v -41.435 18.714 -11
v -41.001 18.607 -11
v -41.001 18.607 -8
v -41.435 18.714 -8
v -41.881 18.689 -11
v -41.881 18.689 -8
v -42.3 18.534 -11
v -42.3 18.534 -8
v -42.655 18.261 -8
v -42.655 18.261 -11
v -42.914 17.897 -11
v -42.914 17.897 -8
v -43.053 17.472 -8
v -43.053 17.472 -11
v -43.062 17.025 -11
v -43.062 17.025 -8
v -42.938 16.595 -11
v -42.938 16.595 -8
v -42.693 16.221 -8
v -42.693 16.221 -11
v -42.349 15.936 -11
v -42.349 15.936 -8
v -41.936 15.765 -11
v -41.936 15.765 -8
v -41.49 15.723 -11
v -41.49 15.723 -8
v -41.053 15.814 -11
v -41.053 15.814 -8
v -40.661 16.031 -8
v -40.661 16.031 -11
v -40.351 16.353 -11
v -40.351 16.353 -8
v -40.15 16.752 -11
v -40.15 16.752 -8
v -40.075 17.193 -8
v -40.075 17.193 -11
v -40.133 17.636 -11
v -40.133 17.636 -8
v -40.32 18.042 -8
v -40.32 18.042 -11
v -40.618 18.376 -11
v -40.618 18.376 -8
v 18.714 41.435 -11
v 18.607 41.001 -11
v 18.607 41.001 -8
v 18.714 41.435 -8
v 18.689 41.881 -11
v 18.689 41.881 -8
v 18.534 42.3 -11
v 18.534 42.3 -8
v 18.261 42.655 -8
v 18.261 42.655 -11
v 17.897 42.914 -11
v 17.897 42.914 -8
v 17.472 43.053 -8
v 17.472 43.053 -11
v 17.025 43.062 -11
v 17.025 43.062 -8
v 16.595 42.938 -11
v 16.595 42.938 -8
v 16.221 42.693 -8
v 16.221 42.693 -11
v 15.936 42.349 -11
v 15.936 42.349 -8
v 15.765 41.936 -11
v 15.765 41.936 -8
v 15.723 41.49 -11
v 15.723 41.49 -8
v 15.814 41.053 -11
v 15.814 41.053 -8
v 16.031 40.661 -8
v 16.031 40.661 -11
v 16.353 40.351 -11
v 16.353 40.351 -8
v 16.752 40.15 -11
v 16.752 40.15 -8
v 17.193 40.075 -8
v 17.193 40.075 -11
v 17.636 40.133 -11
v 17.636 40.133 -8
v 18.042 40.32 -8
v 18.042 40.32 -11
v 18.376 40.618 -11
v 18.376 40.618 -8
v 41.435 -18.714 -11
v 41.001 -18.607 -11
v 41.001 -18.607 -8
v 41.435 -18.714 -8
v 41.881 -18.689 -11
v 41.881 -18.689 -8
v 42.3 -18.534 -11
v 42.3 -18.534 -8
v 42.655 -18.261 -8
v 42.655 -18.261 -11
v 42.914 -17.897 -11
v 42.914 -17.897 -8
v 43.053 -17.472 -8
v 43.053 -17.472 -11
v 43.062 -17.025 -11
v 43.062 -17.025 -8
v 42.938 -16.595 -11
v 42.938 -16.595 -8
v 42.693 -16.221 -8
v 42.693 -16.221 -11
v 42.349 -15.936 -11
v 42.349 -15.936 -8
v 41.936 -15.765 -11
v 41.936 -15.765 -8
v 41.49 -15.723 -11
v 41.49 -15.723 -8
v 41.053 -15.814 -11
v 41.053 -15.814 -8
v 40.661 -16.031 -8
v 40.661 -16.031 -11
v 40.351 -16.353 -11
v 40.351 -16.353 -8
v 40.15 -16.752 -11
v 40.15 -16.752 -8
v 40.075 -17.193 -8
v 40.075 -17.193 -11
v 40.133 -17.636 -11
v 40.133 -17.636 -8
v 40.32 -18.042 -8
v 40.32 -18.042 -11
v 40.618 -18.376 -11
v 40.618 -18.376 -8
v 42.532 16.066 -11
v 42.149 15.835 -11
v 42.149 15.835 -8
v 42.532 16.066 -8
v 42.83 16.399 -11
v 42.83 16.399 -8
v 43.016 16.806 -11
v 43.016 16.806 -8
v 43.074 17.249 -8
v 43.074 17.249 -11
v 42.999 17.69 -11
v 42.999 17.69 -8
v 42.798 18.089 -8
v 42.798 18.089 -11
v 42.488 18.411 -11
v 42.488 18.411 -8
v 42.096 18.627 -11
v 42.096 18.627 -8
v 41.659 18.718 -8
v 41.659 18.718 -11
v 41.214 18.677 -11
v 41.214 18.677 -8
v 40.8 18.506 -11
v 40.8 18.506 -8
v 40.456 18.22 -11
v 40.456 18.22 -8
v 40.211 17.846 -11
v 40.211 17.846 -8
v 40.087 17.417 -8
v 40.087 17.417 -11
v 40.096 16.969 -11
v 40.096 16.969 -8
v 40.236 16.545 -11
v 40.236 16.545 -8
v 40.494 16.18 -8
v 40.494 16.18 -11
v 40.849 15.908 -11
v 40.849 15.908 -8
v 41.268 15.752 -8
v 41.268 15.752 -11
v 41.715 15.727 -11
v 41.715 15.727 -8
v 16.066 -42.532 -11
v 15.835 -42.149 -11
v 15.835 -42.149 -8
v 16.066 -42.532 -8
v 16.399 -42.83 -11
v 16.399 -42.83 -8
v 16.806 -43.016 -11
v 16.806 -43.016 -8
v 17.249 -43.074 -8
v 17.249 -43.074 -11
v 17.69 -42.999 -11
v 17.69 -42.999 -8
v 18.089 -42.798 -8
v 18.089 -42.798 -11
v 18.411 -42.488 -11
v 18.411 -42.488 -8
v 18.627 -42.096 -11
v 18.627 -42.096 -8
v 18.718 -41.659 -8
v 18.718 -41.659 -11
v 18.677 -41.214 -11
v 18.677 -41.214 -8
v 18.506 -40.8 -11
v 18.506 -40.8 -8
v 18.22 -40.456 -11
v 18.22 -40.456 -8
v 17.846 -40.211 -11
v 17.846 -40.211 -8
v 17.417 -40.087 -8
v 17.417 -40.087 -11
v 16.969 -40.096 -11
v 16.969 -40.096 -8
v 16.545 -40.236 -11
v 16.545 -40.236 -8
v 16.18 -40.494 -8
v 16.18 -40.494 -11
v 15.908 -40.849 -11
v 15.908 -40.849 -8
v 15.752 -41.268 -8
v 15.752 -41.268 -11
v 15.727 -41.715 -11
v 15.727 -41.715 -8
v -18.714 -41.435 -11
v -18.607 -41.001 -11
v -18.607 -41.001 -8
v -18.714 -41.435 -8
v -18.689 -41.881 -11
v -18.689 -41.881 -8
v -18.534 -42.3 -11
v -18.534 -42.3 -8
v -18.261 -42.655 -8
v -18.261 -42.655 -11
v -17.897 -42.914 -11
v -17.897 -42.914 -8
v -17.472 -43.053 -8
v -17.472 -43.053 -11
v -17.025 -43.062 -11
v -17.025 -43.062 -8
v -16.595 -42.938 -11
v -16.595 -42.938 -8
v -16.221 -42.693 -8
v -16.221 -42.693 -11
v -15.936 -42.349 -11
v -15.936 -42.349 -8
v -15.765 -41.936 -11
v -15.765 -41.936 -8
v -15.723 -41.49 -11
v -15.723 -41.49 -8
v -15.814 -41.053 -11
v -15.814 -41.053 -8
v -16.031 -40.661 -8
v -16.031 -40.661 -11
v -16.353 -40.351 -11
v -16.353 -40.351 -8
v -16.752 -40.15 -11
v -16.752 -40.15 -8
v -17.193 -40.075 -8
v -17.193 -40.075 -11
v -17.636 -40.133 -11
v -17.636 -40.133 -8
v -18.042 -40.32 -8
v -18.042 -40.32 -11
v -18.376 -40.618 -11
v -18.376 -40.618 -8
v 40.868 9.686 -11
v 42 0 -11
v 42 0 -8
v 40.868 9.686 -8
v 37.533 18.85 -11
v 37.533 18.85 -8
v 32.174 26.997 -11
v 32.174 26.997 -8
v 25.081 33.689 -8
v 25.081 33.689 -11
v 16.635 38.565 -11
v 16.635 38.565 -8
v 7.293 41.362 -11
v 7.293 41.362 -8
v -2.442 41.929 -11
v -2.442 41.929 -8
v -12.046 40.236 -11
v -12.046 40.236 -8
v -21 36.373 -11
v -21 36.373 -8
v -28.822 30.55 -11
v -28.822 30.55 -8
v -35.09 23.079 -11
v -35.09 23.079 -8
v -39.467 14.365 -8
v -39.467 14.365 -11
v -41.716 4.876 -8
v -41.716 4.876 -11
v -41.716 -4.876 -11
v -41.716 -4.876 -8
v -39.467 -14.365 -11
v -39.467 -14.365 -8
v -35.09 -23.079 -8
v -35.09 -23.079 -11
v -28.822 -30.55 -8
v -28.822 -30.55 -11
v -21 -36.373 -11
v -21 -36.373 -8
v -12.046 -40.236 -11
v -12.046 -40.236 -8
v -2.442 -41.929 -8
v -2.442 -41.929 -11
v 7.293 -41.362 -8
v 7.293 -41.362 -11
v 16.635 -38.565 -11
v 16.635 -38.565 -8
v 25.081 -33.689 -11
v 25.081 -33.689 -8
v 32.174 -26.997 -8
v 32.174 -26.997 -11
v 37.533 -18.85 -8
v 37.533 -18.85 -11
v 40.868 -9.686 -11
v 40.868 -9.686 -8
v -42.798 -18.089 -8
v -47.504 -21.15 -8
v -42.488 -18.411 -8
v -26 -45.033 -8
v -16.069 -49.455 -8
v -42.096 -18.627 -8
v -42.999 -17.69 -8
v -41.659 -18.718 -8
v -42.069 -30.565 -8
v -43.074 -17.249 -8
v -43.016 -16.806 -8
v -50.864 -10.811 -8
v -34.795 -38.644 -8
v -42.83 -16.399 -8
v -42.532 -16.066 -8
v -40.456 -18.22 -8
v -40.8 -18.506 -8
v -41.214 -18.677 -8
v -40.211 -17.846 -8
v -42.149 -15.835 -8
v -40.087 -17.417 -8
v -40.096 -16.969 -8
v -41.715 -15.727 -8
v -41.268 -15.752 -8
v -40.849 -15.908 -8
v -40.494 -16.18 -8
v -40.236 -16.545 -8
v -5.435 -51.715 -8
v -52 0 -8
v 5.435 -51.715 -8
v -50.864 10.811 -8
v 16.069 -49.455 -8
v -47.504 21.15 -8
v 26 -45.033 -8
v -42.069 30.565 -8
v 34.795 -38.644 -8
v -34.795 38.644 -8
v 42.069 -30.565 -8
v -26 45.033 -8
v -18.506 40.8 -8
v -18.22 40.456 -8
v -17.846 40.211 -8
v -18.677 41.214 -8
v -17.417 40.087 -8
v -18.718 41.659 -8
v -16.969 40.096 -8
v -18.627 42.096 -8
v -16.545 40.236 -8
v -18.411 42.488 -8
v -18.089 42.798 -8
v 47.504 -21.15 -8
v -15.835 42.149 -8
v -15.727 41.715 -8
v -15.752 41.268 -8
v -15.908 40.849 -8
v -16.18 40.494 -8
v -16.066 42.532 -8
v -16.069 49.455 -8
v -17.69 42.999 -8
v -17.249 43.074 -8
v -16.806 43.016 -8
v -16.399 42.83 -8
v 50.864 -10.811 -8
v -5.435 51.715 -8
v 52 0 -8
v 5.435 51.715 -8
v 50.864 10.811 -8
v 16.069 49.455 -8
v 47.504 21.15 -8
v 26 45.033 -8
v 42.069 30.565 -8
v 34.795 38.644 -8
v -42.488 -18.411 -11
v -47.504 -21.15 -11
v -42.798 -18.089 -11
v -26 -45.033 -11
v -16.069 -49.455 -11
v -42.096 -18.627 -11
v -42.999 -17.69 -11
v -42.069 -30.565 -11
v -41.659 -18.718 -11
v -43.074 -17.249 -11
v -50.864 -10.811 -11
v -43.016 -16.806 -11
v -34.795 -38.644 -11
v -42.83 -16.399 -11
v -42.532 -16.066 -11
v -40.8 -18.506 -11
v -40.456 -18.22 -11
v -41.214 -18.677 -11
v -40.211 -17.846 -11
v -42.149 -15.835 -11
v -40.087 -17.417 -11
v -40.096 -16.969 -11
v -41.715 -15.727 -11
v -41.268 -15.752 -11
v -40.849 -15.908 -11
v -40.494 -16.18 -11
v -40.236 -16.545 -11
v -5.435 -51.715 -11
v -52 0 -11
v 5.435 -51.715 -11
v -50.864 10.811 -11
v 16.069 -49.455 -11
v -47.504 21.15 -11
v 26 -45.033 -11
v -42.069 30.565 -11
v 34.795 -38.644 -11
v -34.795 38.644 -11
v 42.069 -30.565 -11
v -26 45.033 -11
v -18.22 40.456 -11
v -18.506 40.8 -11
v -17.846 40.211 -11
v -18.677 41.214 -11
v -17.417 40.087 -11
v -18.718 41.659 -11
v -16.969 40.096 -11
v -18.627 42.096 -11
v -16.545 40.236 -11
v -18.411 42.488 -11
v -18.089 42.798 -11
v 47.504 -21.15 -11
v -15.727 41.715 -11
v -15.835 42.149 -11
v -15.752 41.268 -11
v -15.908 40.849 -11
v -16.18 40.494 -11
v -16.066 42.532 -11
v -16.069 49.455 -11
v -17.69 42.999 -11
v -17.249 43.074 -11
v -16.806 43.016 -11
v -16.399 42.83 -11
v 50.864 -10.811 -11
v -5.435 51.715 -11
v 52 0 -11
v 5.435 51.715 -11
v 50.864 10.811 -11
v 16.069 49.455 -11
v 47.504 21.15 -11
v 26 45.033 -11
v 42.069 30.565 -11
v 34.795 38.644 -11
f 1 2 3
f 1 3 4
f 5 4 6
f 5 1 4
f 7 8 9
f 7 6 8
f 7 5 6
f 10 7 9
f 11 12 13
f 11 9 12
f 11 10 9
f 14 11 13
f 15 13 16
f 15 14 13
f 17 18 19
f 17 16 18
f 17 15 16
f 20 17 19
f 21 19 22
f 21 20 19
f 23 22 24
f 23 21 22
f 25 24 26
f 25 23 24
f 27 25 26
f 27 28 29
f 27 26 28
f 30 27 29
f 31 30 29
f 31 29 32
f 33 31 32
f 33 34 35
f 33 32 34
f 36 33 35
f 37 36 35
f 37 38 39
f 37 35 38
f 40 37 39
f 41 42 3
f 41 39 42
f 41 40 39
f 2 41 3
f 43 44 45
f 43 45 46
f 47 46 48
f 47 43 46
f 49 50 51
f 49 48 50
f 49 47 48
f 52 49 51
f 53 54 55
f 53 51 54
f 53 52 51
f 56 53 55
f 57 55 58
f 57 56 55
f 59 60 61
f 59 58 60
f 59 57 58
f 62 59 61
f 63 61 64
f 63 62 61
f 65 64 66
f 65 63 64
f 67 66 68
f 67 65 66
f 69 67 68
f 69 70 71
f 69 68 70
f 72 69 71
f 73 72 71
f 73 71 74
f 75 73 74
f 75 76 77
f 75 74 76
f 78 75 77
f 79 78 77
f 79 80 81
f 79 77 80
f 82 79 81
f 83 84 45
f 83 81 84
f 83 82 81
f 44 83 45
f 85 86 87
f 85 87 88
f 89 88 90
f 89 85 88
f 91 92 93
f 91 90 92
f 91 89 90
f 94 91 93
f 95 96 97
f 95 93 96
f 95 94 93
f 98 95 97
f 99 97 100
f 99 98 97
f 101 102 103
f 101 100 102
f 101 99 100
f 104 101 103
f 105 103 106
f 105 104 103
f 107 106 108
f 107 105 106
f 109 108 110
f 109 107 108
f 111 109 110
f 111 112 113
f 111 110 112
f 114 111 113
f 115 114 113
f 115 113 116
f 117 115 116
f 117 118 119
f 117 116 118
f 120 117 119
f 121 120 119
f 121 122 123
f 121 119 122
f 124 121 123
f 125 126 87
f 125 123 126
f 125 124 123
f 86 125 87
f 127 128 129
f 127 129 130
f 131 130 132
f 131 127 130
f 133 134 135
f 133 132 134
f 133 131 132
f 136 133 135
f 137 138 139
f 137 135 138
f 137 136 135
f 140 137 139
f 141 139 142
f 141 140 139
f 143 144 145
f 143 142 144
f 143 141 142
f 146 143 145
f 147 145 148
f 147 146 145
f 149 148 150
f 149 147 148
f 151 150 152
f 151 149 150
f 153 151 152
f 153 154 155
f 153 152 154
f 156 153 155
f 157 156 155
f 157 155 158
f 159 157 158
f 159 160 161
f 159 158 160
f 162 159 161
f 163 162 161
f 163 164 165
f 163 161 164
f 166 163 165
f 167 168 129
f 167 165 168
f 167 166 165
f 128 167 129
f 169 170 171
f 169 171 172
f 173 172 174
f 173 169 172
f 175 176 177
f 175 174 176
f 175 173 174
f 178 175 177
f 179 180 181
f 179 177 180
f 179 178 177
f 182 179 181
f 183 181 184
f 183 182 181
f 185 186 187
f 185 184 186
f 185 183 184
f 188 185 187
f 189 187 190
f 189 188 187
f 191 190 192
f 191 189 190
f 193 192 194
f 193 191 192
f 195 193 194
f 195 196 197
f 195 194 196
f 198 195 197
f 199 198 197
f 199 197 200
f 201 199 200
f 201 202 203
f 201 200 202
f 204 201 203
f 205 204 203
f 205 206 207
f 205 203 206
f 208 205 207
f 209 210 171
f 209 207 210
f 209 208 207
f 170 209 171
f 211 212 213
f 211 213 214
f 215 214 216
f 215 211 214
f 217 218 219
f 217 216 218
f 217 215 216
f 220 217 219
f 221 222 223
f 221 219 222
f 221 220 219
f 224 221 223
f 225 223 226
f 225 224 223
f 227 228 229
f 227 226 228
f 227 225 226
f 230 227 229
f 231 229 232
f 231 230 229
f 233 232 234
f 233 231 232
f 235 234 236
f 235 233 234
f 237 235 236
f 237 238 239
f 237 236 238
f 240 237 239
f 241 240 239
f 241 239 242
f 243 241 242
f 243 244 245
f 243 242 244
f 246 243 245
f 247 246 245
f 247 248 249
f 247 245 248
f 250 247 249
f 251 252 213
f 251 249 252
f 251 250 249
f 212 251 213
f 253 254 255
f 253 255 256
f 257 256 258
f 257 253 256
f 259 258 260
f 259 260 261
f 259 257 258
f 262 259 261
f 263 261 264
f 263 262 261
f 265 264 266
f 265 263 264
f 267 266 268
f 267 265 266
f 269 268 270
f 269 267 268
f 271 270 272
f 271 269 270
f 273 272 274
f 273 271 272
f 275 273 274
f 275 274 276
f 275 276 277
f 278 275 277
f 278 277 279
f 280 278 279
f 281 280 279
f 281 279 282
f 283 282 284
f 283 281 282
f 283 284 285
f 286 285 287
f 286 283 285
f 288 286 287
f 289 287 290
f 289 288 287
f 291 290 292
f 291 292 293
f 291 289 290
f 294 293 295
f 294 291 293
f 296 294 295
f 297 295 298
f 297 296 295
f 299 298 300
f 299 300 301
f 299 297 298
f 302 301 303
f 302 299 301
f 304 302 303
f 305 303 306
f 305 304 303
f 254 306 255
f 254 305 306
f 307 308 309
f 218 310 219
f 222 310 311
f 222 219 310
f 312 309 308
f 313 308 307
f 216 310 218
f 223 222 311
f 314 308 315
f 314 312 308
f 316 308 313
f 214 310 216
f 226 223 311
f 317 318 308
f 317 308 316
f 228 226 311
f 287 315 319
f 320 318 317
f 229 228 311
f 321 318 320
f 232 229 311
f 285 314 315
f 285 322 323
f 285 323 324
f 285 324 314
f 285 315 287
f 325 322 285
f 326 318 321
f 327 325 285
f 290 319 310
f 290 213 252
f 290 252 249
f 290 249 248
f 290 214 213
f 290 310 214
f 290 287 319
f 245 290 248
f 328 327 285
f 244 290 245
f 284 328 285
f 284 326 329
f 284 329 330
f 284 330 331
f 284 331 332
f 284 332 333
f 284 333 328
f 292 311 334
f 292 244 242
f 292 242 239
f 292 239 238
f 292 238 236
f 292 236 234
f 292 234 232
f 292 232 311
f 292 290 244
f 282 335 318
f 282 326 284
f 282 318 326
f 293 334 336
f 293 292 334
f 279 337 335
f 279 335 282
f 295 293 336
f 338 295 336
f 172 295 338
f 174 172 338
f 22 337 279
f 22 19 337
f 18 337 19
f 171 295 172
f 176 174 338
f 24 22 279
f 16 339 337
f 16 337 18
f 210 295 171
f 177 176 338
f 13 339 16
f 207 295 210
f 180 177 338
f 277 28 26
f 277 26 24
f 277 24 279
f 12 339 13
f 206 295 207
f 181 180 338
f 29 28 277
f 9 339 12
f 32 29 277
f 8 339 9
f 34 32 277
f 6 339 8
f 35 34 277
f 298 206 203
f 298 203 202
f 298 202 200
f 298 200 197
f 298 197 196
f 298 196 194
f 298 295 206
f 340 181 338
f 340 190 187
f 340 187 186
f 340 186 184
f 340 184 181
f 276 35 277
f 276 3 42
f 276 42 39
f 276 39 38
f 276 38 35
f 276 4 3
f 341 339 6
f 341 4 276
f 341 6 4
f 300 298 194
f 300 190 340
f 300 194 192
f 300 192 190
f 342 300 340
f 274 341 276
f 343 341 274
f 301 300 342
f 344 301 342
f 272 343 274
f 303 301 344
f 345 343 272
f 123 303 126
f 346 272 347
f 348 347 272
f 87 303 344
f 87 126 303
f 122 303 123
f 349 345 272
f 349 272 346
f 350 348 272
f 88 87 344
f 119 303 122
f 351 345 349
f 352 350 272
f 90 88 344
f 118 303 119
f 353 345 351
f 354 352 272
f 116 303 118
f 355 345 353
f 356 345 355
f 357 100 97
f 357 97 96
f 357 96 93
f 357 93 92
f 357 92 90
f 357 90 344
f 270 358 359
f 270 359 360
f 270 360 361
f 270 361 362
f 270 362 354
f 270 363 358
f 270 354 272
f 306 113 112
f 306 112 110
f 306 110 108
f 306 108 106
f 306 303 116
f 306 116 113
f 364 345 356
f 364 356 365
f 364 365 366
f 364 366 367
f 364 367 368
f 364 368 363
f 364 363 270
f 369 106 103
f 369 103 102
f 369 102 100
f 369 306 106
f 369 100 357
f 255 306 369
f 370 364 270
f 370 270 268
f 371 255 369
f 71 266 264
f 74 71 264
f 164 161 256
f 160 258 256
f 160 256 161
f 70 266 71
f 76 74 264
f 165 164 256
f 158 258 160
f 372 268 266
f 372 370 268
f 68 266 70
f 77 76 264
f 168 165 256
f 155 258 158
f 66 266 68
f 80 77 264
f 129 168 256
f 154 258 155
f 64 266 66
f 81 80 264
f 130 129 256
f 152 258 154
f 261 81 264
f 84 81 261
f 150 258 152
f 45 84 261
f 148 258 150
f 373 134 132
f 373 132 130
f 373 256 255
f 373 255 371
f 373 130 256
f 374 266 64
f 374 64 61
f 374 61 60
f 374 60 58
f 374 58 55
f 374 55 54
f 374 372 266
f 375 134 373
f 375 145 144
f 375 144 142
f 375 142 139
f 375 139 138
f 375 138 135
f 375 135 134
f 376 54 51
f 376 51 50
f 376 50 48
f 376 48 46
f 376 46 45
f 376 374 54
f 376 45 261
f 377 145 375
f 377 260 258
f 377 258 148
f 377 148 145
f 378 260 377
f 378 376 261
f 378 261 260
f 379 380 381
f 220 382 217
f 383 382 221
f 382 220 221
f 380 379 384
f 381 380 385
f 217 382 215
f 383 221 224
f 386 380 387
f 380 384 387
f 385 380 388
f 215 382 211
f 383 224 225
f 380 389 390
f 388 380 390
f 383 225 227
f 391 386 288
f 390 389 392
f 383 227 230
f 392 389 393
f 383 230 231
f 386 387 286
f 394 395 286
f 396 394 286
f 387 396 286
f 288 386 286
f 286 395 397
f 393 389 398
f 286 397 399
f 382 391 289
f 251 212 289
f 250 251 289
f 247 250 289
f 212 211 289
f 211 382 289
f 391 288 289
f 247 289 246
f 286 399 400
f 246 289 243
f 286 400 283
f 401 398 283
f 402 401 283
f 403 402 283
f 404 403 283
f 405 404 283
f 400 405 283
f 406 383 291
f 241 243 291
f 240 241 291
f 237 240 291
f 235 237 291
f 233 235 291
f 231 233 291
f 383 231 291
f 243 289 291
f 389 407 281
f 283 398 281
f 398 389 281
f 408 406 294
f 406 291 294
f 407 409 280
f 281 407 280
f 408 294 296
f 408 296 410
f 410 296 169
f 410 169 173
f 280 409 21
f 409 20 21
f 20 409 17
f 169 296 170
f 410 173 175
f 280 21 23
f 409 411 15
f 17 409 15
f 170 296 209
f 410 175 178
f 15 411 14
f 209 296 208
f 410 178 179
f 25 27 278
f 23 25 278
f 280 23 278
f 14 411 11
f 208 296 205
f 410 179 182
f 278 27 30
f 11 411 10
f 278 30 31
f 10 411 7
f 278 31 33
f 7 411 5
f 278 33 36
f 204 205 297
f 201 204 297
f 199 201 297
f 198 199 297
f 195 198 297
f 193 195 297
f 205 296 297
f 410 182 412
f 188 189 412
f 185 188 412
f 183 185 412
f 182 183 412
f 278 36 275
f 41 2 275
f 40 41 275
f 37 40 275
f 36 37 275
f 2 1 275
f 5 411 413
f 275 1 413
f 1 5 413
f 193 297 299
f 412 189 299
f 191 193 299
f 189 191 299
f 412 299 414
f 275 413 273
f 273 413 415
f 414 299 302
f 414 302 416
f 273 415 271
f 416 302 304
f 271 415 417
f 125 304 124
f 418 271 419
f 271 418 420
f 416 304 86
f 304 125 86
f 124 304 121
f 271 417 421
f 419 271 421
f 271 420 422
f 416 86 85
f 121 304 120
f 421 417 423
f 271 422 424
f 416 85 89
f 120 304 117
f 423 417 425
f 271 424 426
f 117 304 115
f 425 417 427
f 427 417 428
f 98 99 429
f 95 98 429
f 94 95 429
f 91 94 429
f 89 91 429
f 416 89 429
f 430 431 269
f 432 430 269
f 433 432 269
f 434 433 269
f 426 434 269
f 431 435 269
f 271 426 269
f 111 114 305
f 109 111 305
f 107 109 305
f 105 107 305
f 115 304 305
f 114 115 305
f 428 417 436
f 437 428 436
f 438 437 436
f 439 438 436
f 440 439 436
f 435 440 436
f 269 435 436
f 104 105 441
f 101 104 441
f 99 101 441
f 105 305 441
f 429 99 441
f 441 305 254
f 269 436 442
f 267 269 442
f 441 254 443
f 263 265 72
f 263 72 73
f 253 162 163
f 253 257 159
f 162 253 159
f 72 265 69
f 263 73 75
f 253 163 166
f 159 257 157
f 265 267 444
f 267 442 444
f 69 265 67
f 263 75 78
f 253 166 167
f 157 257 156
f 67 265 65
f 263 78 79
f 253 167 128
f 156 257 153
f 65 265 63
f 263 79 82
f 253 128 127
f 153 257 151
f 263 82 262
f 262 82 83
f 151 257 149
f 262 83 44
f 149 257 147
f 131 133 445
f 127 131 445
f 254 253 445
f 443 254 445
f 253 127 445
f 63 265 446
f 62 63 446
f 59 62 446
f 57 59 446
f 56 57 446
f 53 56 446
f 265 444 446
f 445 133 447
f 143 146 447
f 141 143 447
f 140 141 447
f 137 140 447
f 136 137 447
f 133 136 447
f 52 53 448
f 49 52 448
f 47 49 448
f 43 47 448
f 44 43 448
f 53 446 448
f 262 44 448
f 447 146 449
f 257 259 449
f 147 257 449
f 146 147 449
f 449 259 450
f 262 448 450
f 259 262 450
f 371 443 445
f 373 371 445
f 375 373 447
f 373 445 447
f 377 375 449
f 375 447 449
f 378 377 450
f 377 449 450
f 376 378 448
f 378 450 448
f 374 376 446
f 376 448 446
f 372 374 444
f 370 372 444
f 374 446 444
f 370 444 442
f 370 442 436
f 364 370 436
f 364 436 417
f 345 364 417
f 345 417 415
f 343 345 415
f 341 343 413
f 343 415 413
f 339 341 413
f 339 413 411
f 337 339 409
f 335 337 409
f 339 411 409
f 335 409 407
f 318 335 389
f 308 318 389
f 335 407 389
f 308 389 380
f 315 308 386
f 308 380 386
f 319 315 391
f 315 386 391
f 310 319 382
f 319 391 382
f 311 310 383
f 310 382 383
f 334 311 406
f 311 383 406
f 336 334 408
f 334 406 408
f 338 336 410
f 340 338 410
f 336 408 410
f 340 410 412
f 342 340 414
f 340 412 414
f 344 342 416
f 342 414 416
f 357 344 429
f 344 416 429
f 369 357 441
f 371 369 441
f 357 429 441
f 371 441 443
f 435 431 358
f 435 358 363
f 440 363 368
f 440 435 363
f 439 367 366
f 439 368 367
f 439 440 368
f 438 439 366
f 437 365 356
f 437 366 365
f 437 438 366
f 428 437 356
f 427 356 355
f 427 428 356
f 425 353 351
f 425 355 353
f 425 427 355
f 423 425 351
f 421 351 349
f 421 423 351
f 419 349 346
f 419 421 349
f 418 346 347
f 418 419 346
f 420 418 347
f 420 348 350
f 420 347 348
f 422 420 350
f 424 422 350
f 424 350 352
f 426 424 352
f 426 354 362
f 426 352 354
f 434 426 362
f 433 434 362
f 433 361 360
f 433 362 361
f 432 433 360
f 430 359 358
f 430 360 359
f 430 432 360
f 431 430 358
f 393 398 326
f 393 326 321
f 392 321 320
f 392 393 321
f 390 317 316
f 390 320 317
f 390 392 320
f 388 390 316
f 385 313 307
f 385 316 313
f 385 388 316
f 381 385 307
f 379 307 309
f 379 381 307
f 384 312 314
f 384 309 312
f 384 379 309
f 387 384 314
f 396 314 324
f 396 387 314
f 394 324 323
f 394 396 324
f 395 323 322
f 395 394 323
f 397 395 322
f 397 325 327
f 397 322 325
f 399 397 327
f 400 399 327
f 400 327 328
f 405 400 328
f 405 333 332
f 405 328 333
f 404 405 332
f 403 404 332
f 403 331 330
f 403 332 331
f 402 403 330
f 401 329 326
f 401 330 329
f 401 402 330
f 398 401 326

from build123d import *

# Parameters (mm, degrees)
CYLINDER250_R               = 1.5
CYLINDER250_DEPTH           = 20
CYLINDER250_PLACEMENT_ANGLE = 45
CYLINDER251_R               = 1.5
CYLINDER251_DEPTH           = 20
CYLINDER252_R               = 1.5
CYLINDER252_DEPTH           = 20
CYLINDER252_PLACEMENT_ANGLE = 135
CYLINDER247_R               = 1.5
CYLINDER247_DEPTH           = 20
CYLINDER249_R               = 1.5
CYLINDER249_DEPTH           = 20
CYLINDER249_PLACEMENT_ANGLE = 225
CYLINDER246_R               = 1.5
CYLINDER246_DEPTH           = 20
CYLINDER248_R               = 1.5
CYLINDER248_DEPTH           = 20
CYLINDER248_PLACEMENT_ANGLE = 45
CYLINDER245_R               = 1.5
CYLINDER245_DEPTH           = 20
COMPOUND224_PLACEMENT_ANGLE = 22.5
TUBE025_R                   = 52
TUBE025_R_2                 = 42
TUBE025_DEPTH               = 3


with BuildPart() as v_lec250:
    # Cylinder250 → Cylinder250 (new body)
    with BuildSketch(Plane.XY):
        Circle(CYLINDER250_R)
    extrude(amount=CYLINDER250_DEPTH)


with BuildPart() as v_lec250_1:
    # Cylinder250 placement: moved
    add(v_lec250.part.moved(Location((-31.819805, 31.819805, -18))).rotate(Axis((-31.819805, 31.819805, -18), (0, 0, 1)), CYLINDER250_PLACEMENT_ANGLE))


with BuildPart() as v_lec251:
    # Cylinder251 → Cylinder251 (new body)
    with BuildSketch(Plane(origin=(-45, 0, -18), x_dir=(0, 1, 0), z_dir=(0, 0, 1))):
        Circle(CYLINDER251_R)
    extrude(amount=CYLINDER251_DEPTH)


with BuildPart() as v_lec252:
    # Cylinder252 → Cylinder252 (new body)
    with BuildSketch(Plane.XY):
        Circle(CYLINDER252_R)
    extrude(amount=CYLINDER252_DEPTH)


with BuildPart() as v_lec252_1:
    # Cylinder252 placement: moved
    add(v_lec252.part.moved(Location((-31.819805, -31.819805, -18))).rotate(Axis((-31.819805, -31.819805, -18), (0, 0, 1)), CYLINDER252_PLACEMENT_ANGLE))


with BuildPart() as v_lec247:
    # Cylinder247 → Cylinder247 (new body)
    with BuildSketch(Plane(origin=(0, -45, -18), x_dir=(-1, 0, 0), z_dir=(0, 0, 1))):
        Circle(CYLINDER247_R)
    extrude(amount=CYLINDER247_DEPTH)


with BuildPart() as v_lec249:
    # Cylinder249 → Cylinder249 (new body)
    with BuildSketch(Plane.XY):
        Circle(CYLINDER249_R)
    extrude(amount=CYLINDER249_DEPTH)


with BuildPart() as v_lec249_1:
    # Cylinder249 placement: moved
    add(v_lec249.part.moved(Location((31.819805, -31.819805, -18))).rotate(Axis((31.819805, -31.819805, -18), (0, 0, 1)), CYLINDER249_PLACEMENT_ANGLE))


with BuildPart() as v_lec246:
    # Cylinder246 → Cylinder246 (new body)
    with BuildSketch(Plane(origin=(45, 0, -18), x_dir=(0, -1, 0), z_dir=(0, 0, 1))):
        Circle(CYLINDER246_R)
    extrude(amount=CYLINDER246_DEPTH)


with BuildPart() as v_lec248:
    # Cylinder248 → Cylinder248 (new body)
    with BuildSketch(Plane.XY):
        Circle(CYLINDER248_R)
    extrude(amount=CYLINDER248_DEPTH)


with BuildPart() as v_lec248_1:
    # Cylinder248 placement: moved
    add(v_lec248.part.moved(Location((31.819805, 31.819805, -18))).rotate(Axis((31.819805, 31.819805, -18), (0, 0, -1)), CYLINDER248_PLACEMENT_ANGLE))


with BuildPart() as compound224:
    # Cylinder245 → Cylinder245 (new body)
    with BuildSketch(Plane(origin=(0, 45, -18), x_dir=(1, 0, 0), z_dir=(0, 0, 1))):
        Circle(CYLINDER245_R)
    extrude(amount=CYLINDER245_DEPTH)

    # Compound224: union Válec250, Válec251, Válec252, Válec247, Válec249, Válec246, Válec248
    add(v_lec250_1.part)
    add(v_lec251.part)
    add(v_lec252_1.part)
    add(v_lec247.part)
    add(v_lec249_1.part)
    add(v_lec246.part)
    add(v_lec248_1.part)


with BuildPart() as compound224_1:
    # Compound224 placement: moved
    add(compound224.part.rotate(Axis((0, 0, 0), (0, 0, 1)), COMPOUND224_PLACEMENT_ANGLE))


with BuildPart() as j_max_motor_washer:
    # Tube025 → Tube025 (new body)
    with BuildSketch(Plane.XY.offset(-11)):
        Circle(TUBE025_R)
        Circle(TUBE025_R_2, mode=Mode.SUBTRACT)
    extrude(amount=TUBE025_DEPTH)

    # Cut118: cut Compound224
    add(compound224_1.part, mode=Mode.SUBTRACT)


solid = j_max_motor_washer.part
